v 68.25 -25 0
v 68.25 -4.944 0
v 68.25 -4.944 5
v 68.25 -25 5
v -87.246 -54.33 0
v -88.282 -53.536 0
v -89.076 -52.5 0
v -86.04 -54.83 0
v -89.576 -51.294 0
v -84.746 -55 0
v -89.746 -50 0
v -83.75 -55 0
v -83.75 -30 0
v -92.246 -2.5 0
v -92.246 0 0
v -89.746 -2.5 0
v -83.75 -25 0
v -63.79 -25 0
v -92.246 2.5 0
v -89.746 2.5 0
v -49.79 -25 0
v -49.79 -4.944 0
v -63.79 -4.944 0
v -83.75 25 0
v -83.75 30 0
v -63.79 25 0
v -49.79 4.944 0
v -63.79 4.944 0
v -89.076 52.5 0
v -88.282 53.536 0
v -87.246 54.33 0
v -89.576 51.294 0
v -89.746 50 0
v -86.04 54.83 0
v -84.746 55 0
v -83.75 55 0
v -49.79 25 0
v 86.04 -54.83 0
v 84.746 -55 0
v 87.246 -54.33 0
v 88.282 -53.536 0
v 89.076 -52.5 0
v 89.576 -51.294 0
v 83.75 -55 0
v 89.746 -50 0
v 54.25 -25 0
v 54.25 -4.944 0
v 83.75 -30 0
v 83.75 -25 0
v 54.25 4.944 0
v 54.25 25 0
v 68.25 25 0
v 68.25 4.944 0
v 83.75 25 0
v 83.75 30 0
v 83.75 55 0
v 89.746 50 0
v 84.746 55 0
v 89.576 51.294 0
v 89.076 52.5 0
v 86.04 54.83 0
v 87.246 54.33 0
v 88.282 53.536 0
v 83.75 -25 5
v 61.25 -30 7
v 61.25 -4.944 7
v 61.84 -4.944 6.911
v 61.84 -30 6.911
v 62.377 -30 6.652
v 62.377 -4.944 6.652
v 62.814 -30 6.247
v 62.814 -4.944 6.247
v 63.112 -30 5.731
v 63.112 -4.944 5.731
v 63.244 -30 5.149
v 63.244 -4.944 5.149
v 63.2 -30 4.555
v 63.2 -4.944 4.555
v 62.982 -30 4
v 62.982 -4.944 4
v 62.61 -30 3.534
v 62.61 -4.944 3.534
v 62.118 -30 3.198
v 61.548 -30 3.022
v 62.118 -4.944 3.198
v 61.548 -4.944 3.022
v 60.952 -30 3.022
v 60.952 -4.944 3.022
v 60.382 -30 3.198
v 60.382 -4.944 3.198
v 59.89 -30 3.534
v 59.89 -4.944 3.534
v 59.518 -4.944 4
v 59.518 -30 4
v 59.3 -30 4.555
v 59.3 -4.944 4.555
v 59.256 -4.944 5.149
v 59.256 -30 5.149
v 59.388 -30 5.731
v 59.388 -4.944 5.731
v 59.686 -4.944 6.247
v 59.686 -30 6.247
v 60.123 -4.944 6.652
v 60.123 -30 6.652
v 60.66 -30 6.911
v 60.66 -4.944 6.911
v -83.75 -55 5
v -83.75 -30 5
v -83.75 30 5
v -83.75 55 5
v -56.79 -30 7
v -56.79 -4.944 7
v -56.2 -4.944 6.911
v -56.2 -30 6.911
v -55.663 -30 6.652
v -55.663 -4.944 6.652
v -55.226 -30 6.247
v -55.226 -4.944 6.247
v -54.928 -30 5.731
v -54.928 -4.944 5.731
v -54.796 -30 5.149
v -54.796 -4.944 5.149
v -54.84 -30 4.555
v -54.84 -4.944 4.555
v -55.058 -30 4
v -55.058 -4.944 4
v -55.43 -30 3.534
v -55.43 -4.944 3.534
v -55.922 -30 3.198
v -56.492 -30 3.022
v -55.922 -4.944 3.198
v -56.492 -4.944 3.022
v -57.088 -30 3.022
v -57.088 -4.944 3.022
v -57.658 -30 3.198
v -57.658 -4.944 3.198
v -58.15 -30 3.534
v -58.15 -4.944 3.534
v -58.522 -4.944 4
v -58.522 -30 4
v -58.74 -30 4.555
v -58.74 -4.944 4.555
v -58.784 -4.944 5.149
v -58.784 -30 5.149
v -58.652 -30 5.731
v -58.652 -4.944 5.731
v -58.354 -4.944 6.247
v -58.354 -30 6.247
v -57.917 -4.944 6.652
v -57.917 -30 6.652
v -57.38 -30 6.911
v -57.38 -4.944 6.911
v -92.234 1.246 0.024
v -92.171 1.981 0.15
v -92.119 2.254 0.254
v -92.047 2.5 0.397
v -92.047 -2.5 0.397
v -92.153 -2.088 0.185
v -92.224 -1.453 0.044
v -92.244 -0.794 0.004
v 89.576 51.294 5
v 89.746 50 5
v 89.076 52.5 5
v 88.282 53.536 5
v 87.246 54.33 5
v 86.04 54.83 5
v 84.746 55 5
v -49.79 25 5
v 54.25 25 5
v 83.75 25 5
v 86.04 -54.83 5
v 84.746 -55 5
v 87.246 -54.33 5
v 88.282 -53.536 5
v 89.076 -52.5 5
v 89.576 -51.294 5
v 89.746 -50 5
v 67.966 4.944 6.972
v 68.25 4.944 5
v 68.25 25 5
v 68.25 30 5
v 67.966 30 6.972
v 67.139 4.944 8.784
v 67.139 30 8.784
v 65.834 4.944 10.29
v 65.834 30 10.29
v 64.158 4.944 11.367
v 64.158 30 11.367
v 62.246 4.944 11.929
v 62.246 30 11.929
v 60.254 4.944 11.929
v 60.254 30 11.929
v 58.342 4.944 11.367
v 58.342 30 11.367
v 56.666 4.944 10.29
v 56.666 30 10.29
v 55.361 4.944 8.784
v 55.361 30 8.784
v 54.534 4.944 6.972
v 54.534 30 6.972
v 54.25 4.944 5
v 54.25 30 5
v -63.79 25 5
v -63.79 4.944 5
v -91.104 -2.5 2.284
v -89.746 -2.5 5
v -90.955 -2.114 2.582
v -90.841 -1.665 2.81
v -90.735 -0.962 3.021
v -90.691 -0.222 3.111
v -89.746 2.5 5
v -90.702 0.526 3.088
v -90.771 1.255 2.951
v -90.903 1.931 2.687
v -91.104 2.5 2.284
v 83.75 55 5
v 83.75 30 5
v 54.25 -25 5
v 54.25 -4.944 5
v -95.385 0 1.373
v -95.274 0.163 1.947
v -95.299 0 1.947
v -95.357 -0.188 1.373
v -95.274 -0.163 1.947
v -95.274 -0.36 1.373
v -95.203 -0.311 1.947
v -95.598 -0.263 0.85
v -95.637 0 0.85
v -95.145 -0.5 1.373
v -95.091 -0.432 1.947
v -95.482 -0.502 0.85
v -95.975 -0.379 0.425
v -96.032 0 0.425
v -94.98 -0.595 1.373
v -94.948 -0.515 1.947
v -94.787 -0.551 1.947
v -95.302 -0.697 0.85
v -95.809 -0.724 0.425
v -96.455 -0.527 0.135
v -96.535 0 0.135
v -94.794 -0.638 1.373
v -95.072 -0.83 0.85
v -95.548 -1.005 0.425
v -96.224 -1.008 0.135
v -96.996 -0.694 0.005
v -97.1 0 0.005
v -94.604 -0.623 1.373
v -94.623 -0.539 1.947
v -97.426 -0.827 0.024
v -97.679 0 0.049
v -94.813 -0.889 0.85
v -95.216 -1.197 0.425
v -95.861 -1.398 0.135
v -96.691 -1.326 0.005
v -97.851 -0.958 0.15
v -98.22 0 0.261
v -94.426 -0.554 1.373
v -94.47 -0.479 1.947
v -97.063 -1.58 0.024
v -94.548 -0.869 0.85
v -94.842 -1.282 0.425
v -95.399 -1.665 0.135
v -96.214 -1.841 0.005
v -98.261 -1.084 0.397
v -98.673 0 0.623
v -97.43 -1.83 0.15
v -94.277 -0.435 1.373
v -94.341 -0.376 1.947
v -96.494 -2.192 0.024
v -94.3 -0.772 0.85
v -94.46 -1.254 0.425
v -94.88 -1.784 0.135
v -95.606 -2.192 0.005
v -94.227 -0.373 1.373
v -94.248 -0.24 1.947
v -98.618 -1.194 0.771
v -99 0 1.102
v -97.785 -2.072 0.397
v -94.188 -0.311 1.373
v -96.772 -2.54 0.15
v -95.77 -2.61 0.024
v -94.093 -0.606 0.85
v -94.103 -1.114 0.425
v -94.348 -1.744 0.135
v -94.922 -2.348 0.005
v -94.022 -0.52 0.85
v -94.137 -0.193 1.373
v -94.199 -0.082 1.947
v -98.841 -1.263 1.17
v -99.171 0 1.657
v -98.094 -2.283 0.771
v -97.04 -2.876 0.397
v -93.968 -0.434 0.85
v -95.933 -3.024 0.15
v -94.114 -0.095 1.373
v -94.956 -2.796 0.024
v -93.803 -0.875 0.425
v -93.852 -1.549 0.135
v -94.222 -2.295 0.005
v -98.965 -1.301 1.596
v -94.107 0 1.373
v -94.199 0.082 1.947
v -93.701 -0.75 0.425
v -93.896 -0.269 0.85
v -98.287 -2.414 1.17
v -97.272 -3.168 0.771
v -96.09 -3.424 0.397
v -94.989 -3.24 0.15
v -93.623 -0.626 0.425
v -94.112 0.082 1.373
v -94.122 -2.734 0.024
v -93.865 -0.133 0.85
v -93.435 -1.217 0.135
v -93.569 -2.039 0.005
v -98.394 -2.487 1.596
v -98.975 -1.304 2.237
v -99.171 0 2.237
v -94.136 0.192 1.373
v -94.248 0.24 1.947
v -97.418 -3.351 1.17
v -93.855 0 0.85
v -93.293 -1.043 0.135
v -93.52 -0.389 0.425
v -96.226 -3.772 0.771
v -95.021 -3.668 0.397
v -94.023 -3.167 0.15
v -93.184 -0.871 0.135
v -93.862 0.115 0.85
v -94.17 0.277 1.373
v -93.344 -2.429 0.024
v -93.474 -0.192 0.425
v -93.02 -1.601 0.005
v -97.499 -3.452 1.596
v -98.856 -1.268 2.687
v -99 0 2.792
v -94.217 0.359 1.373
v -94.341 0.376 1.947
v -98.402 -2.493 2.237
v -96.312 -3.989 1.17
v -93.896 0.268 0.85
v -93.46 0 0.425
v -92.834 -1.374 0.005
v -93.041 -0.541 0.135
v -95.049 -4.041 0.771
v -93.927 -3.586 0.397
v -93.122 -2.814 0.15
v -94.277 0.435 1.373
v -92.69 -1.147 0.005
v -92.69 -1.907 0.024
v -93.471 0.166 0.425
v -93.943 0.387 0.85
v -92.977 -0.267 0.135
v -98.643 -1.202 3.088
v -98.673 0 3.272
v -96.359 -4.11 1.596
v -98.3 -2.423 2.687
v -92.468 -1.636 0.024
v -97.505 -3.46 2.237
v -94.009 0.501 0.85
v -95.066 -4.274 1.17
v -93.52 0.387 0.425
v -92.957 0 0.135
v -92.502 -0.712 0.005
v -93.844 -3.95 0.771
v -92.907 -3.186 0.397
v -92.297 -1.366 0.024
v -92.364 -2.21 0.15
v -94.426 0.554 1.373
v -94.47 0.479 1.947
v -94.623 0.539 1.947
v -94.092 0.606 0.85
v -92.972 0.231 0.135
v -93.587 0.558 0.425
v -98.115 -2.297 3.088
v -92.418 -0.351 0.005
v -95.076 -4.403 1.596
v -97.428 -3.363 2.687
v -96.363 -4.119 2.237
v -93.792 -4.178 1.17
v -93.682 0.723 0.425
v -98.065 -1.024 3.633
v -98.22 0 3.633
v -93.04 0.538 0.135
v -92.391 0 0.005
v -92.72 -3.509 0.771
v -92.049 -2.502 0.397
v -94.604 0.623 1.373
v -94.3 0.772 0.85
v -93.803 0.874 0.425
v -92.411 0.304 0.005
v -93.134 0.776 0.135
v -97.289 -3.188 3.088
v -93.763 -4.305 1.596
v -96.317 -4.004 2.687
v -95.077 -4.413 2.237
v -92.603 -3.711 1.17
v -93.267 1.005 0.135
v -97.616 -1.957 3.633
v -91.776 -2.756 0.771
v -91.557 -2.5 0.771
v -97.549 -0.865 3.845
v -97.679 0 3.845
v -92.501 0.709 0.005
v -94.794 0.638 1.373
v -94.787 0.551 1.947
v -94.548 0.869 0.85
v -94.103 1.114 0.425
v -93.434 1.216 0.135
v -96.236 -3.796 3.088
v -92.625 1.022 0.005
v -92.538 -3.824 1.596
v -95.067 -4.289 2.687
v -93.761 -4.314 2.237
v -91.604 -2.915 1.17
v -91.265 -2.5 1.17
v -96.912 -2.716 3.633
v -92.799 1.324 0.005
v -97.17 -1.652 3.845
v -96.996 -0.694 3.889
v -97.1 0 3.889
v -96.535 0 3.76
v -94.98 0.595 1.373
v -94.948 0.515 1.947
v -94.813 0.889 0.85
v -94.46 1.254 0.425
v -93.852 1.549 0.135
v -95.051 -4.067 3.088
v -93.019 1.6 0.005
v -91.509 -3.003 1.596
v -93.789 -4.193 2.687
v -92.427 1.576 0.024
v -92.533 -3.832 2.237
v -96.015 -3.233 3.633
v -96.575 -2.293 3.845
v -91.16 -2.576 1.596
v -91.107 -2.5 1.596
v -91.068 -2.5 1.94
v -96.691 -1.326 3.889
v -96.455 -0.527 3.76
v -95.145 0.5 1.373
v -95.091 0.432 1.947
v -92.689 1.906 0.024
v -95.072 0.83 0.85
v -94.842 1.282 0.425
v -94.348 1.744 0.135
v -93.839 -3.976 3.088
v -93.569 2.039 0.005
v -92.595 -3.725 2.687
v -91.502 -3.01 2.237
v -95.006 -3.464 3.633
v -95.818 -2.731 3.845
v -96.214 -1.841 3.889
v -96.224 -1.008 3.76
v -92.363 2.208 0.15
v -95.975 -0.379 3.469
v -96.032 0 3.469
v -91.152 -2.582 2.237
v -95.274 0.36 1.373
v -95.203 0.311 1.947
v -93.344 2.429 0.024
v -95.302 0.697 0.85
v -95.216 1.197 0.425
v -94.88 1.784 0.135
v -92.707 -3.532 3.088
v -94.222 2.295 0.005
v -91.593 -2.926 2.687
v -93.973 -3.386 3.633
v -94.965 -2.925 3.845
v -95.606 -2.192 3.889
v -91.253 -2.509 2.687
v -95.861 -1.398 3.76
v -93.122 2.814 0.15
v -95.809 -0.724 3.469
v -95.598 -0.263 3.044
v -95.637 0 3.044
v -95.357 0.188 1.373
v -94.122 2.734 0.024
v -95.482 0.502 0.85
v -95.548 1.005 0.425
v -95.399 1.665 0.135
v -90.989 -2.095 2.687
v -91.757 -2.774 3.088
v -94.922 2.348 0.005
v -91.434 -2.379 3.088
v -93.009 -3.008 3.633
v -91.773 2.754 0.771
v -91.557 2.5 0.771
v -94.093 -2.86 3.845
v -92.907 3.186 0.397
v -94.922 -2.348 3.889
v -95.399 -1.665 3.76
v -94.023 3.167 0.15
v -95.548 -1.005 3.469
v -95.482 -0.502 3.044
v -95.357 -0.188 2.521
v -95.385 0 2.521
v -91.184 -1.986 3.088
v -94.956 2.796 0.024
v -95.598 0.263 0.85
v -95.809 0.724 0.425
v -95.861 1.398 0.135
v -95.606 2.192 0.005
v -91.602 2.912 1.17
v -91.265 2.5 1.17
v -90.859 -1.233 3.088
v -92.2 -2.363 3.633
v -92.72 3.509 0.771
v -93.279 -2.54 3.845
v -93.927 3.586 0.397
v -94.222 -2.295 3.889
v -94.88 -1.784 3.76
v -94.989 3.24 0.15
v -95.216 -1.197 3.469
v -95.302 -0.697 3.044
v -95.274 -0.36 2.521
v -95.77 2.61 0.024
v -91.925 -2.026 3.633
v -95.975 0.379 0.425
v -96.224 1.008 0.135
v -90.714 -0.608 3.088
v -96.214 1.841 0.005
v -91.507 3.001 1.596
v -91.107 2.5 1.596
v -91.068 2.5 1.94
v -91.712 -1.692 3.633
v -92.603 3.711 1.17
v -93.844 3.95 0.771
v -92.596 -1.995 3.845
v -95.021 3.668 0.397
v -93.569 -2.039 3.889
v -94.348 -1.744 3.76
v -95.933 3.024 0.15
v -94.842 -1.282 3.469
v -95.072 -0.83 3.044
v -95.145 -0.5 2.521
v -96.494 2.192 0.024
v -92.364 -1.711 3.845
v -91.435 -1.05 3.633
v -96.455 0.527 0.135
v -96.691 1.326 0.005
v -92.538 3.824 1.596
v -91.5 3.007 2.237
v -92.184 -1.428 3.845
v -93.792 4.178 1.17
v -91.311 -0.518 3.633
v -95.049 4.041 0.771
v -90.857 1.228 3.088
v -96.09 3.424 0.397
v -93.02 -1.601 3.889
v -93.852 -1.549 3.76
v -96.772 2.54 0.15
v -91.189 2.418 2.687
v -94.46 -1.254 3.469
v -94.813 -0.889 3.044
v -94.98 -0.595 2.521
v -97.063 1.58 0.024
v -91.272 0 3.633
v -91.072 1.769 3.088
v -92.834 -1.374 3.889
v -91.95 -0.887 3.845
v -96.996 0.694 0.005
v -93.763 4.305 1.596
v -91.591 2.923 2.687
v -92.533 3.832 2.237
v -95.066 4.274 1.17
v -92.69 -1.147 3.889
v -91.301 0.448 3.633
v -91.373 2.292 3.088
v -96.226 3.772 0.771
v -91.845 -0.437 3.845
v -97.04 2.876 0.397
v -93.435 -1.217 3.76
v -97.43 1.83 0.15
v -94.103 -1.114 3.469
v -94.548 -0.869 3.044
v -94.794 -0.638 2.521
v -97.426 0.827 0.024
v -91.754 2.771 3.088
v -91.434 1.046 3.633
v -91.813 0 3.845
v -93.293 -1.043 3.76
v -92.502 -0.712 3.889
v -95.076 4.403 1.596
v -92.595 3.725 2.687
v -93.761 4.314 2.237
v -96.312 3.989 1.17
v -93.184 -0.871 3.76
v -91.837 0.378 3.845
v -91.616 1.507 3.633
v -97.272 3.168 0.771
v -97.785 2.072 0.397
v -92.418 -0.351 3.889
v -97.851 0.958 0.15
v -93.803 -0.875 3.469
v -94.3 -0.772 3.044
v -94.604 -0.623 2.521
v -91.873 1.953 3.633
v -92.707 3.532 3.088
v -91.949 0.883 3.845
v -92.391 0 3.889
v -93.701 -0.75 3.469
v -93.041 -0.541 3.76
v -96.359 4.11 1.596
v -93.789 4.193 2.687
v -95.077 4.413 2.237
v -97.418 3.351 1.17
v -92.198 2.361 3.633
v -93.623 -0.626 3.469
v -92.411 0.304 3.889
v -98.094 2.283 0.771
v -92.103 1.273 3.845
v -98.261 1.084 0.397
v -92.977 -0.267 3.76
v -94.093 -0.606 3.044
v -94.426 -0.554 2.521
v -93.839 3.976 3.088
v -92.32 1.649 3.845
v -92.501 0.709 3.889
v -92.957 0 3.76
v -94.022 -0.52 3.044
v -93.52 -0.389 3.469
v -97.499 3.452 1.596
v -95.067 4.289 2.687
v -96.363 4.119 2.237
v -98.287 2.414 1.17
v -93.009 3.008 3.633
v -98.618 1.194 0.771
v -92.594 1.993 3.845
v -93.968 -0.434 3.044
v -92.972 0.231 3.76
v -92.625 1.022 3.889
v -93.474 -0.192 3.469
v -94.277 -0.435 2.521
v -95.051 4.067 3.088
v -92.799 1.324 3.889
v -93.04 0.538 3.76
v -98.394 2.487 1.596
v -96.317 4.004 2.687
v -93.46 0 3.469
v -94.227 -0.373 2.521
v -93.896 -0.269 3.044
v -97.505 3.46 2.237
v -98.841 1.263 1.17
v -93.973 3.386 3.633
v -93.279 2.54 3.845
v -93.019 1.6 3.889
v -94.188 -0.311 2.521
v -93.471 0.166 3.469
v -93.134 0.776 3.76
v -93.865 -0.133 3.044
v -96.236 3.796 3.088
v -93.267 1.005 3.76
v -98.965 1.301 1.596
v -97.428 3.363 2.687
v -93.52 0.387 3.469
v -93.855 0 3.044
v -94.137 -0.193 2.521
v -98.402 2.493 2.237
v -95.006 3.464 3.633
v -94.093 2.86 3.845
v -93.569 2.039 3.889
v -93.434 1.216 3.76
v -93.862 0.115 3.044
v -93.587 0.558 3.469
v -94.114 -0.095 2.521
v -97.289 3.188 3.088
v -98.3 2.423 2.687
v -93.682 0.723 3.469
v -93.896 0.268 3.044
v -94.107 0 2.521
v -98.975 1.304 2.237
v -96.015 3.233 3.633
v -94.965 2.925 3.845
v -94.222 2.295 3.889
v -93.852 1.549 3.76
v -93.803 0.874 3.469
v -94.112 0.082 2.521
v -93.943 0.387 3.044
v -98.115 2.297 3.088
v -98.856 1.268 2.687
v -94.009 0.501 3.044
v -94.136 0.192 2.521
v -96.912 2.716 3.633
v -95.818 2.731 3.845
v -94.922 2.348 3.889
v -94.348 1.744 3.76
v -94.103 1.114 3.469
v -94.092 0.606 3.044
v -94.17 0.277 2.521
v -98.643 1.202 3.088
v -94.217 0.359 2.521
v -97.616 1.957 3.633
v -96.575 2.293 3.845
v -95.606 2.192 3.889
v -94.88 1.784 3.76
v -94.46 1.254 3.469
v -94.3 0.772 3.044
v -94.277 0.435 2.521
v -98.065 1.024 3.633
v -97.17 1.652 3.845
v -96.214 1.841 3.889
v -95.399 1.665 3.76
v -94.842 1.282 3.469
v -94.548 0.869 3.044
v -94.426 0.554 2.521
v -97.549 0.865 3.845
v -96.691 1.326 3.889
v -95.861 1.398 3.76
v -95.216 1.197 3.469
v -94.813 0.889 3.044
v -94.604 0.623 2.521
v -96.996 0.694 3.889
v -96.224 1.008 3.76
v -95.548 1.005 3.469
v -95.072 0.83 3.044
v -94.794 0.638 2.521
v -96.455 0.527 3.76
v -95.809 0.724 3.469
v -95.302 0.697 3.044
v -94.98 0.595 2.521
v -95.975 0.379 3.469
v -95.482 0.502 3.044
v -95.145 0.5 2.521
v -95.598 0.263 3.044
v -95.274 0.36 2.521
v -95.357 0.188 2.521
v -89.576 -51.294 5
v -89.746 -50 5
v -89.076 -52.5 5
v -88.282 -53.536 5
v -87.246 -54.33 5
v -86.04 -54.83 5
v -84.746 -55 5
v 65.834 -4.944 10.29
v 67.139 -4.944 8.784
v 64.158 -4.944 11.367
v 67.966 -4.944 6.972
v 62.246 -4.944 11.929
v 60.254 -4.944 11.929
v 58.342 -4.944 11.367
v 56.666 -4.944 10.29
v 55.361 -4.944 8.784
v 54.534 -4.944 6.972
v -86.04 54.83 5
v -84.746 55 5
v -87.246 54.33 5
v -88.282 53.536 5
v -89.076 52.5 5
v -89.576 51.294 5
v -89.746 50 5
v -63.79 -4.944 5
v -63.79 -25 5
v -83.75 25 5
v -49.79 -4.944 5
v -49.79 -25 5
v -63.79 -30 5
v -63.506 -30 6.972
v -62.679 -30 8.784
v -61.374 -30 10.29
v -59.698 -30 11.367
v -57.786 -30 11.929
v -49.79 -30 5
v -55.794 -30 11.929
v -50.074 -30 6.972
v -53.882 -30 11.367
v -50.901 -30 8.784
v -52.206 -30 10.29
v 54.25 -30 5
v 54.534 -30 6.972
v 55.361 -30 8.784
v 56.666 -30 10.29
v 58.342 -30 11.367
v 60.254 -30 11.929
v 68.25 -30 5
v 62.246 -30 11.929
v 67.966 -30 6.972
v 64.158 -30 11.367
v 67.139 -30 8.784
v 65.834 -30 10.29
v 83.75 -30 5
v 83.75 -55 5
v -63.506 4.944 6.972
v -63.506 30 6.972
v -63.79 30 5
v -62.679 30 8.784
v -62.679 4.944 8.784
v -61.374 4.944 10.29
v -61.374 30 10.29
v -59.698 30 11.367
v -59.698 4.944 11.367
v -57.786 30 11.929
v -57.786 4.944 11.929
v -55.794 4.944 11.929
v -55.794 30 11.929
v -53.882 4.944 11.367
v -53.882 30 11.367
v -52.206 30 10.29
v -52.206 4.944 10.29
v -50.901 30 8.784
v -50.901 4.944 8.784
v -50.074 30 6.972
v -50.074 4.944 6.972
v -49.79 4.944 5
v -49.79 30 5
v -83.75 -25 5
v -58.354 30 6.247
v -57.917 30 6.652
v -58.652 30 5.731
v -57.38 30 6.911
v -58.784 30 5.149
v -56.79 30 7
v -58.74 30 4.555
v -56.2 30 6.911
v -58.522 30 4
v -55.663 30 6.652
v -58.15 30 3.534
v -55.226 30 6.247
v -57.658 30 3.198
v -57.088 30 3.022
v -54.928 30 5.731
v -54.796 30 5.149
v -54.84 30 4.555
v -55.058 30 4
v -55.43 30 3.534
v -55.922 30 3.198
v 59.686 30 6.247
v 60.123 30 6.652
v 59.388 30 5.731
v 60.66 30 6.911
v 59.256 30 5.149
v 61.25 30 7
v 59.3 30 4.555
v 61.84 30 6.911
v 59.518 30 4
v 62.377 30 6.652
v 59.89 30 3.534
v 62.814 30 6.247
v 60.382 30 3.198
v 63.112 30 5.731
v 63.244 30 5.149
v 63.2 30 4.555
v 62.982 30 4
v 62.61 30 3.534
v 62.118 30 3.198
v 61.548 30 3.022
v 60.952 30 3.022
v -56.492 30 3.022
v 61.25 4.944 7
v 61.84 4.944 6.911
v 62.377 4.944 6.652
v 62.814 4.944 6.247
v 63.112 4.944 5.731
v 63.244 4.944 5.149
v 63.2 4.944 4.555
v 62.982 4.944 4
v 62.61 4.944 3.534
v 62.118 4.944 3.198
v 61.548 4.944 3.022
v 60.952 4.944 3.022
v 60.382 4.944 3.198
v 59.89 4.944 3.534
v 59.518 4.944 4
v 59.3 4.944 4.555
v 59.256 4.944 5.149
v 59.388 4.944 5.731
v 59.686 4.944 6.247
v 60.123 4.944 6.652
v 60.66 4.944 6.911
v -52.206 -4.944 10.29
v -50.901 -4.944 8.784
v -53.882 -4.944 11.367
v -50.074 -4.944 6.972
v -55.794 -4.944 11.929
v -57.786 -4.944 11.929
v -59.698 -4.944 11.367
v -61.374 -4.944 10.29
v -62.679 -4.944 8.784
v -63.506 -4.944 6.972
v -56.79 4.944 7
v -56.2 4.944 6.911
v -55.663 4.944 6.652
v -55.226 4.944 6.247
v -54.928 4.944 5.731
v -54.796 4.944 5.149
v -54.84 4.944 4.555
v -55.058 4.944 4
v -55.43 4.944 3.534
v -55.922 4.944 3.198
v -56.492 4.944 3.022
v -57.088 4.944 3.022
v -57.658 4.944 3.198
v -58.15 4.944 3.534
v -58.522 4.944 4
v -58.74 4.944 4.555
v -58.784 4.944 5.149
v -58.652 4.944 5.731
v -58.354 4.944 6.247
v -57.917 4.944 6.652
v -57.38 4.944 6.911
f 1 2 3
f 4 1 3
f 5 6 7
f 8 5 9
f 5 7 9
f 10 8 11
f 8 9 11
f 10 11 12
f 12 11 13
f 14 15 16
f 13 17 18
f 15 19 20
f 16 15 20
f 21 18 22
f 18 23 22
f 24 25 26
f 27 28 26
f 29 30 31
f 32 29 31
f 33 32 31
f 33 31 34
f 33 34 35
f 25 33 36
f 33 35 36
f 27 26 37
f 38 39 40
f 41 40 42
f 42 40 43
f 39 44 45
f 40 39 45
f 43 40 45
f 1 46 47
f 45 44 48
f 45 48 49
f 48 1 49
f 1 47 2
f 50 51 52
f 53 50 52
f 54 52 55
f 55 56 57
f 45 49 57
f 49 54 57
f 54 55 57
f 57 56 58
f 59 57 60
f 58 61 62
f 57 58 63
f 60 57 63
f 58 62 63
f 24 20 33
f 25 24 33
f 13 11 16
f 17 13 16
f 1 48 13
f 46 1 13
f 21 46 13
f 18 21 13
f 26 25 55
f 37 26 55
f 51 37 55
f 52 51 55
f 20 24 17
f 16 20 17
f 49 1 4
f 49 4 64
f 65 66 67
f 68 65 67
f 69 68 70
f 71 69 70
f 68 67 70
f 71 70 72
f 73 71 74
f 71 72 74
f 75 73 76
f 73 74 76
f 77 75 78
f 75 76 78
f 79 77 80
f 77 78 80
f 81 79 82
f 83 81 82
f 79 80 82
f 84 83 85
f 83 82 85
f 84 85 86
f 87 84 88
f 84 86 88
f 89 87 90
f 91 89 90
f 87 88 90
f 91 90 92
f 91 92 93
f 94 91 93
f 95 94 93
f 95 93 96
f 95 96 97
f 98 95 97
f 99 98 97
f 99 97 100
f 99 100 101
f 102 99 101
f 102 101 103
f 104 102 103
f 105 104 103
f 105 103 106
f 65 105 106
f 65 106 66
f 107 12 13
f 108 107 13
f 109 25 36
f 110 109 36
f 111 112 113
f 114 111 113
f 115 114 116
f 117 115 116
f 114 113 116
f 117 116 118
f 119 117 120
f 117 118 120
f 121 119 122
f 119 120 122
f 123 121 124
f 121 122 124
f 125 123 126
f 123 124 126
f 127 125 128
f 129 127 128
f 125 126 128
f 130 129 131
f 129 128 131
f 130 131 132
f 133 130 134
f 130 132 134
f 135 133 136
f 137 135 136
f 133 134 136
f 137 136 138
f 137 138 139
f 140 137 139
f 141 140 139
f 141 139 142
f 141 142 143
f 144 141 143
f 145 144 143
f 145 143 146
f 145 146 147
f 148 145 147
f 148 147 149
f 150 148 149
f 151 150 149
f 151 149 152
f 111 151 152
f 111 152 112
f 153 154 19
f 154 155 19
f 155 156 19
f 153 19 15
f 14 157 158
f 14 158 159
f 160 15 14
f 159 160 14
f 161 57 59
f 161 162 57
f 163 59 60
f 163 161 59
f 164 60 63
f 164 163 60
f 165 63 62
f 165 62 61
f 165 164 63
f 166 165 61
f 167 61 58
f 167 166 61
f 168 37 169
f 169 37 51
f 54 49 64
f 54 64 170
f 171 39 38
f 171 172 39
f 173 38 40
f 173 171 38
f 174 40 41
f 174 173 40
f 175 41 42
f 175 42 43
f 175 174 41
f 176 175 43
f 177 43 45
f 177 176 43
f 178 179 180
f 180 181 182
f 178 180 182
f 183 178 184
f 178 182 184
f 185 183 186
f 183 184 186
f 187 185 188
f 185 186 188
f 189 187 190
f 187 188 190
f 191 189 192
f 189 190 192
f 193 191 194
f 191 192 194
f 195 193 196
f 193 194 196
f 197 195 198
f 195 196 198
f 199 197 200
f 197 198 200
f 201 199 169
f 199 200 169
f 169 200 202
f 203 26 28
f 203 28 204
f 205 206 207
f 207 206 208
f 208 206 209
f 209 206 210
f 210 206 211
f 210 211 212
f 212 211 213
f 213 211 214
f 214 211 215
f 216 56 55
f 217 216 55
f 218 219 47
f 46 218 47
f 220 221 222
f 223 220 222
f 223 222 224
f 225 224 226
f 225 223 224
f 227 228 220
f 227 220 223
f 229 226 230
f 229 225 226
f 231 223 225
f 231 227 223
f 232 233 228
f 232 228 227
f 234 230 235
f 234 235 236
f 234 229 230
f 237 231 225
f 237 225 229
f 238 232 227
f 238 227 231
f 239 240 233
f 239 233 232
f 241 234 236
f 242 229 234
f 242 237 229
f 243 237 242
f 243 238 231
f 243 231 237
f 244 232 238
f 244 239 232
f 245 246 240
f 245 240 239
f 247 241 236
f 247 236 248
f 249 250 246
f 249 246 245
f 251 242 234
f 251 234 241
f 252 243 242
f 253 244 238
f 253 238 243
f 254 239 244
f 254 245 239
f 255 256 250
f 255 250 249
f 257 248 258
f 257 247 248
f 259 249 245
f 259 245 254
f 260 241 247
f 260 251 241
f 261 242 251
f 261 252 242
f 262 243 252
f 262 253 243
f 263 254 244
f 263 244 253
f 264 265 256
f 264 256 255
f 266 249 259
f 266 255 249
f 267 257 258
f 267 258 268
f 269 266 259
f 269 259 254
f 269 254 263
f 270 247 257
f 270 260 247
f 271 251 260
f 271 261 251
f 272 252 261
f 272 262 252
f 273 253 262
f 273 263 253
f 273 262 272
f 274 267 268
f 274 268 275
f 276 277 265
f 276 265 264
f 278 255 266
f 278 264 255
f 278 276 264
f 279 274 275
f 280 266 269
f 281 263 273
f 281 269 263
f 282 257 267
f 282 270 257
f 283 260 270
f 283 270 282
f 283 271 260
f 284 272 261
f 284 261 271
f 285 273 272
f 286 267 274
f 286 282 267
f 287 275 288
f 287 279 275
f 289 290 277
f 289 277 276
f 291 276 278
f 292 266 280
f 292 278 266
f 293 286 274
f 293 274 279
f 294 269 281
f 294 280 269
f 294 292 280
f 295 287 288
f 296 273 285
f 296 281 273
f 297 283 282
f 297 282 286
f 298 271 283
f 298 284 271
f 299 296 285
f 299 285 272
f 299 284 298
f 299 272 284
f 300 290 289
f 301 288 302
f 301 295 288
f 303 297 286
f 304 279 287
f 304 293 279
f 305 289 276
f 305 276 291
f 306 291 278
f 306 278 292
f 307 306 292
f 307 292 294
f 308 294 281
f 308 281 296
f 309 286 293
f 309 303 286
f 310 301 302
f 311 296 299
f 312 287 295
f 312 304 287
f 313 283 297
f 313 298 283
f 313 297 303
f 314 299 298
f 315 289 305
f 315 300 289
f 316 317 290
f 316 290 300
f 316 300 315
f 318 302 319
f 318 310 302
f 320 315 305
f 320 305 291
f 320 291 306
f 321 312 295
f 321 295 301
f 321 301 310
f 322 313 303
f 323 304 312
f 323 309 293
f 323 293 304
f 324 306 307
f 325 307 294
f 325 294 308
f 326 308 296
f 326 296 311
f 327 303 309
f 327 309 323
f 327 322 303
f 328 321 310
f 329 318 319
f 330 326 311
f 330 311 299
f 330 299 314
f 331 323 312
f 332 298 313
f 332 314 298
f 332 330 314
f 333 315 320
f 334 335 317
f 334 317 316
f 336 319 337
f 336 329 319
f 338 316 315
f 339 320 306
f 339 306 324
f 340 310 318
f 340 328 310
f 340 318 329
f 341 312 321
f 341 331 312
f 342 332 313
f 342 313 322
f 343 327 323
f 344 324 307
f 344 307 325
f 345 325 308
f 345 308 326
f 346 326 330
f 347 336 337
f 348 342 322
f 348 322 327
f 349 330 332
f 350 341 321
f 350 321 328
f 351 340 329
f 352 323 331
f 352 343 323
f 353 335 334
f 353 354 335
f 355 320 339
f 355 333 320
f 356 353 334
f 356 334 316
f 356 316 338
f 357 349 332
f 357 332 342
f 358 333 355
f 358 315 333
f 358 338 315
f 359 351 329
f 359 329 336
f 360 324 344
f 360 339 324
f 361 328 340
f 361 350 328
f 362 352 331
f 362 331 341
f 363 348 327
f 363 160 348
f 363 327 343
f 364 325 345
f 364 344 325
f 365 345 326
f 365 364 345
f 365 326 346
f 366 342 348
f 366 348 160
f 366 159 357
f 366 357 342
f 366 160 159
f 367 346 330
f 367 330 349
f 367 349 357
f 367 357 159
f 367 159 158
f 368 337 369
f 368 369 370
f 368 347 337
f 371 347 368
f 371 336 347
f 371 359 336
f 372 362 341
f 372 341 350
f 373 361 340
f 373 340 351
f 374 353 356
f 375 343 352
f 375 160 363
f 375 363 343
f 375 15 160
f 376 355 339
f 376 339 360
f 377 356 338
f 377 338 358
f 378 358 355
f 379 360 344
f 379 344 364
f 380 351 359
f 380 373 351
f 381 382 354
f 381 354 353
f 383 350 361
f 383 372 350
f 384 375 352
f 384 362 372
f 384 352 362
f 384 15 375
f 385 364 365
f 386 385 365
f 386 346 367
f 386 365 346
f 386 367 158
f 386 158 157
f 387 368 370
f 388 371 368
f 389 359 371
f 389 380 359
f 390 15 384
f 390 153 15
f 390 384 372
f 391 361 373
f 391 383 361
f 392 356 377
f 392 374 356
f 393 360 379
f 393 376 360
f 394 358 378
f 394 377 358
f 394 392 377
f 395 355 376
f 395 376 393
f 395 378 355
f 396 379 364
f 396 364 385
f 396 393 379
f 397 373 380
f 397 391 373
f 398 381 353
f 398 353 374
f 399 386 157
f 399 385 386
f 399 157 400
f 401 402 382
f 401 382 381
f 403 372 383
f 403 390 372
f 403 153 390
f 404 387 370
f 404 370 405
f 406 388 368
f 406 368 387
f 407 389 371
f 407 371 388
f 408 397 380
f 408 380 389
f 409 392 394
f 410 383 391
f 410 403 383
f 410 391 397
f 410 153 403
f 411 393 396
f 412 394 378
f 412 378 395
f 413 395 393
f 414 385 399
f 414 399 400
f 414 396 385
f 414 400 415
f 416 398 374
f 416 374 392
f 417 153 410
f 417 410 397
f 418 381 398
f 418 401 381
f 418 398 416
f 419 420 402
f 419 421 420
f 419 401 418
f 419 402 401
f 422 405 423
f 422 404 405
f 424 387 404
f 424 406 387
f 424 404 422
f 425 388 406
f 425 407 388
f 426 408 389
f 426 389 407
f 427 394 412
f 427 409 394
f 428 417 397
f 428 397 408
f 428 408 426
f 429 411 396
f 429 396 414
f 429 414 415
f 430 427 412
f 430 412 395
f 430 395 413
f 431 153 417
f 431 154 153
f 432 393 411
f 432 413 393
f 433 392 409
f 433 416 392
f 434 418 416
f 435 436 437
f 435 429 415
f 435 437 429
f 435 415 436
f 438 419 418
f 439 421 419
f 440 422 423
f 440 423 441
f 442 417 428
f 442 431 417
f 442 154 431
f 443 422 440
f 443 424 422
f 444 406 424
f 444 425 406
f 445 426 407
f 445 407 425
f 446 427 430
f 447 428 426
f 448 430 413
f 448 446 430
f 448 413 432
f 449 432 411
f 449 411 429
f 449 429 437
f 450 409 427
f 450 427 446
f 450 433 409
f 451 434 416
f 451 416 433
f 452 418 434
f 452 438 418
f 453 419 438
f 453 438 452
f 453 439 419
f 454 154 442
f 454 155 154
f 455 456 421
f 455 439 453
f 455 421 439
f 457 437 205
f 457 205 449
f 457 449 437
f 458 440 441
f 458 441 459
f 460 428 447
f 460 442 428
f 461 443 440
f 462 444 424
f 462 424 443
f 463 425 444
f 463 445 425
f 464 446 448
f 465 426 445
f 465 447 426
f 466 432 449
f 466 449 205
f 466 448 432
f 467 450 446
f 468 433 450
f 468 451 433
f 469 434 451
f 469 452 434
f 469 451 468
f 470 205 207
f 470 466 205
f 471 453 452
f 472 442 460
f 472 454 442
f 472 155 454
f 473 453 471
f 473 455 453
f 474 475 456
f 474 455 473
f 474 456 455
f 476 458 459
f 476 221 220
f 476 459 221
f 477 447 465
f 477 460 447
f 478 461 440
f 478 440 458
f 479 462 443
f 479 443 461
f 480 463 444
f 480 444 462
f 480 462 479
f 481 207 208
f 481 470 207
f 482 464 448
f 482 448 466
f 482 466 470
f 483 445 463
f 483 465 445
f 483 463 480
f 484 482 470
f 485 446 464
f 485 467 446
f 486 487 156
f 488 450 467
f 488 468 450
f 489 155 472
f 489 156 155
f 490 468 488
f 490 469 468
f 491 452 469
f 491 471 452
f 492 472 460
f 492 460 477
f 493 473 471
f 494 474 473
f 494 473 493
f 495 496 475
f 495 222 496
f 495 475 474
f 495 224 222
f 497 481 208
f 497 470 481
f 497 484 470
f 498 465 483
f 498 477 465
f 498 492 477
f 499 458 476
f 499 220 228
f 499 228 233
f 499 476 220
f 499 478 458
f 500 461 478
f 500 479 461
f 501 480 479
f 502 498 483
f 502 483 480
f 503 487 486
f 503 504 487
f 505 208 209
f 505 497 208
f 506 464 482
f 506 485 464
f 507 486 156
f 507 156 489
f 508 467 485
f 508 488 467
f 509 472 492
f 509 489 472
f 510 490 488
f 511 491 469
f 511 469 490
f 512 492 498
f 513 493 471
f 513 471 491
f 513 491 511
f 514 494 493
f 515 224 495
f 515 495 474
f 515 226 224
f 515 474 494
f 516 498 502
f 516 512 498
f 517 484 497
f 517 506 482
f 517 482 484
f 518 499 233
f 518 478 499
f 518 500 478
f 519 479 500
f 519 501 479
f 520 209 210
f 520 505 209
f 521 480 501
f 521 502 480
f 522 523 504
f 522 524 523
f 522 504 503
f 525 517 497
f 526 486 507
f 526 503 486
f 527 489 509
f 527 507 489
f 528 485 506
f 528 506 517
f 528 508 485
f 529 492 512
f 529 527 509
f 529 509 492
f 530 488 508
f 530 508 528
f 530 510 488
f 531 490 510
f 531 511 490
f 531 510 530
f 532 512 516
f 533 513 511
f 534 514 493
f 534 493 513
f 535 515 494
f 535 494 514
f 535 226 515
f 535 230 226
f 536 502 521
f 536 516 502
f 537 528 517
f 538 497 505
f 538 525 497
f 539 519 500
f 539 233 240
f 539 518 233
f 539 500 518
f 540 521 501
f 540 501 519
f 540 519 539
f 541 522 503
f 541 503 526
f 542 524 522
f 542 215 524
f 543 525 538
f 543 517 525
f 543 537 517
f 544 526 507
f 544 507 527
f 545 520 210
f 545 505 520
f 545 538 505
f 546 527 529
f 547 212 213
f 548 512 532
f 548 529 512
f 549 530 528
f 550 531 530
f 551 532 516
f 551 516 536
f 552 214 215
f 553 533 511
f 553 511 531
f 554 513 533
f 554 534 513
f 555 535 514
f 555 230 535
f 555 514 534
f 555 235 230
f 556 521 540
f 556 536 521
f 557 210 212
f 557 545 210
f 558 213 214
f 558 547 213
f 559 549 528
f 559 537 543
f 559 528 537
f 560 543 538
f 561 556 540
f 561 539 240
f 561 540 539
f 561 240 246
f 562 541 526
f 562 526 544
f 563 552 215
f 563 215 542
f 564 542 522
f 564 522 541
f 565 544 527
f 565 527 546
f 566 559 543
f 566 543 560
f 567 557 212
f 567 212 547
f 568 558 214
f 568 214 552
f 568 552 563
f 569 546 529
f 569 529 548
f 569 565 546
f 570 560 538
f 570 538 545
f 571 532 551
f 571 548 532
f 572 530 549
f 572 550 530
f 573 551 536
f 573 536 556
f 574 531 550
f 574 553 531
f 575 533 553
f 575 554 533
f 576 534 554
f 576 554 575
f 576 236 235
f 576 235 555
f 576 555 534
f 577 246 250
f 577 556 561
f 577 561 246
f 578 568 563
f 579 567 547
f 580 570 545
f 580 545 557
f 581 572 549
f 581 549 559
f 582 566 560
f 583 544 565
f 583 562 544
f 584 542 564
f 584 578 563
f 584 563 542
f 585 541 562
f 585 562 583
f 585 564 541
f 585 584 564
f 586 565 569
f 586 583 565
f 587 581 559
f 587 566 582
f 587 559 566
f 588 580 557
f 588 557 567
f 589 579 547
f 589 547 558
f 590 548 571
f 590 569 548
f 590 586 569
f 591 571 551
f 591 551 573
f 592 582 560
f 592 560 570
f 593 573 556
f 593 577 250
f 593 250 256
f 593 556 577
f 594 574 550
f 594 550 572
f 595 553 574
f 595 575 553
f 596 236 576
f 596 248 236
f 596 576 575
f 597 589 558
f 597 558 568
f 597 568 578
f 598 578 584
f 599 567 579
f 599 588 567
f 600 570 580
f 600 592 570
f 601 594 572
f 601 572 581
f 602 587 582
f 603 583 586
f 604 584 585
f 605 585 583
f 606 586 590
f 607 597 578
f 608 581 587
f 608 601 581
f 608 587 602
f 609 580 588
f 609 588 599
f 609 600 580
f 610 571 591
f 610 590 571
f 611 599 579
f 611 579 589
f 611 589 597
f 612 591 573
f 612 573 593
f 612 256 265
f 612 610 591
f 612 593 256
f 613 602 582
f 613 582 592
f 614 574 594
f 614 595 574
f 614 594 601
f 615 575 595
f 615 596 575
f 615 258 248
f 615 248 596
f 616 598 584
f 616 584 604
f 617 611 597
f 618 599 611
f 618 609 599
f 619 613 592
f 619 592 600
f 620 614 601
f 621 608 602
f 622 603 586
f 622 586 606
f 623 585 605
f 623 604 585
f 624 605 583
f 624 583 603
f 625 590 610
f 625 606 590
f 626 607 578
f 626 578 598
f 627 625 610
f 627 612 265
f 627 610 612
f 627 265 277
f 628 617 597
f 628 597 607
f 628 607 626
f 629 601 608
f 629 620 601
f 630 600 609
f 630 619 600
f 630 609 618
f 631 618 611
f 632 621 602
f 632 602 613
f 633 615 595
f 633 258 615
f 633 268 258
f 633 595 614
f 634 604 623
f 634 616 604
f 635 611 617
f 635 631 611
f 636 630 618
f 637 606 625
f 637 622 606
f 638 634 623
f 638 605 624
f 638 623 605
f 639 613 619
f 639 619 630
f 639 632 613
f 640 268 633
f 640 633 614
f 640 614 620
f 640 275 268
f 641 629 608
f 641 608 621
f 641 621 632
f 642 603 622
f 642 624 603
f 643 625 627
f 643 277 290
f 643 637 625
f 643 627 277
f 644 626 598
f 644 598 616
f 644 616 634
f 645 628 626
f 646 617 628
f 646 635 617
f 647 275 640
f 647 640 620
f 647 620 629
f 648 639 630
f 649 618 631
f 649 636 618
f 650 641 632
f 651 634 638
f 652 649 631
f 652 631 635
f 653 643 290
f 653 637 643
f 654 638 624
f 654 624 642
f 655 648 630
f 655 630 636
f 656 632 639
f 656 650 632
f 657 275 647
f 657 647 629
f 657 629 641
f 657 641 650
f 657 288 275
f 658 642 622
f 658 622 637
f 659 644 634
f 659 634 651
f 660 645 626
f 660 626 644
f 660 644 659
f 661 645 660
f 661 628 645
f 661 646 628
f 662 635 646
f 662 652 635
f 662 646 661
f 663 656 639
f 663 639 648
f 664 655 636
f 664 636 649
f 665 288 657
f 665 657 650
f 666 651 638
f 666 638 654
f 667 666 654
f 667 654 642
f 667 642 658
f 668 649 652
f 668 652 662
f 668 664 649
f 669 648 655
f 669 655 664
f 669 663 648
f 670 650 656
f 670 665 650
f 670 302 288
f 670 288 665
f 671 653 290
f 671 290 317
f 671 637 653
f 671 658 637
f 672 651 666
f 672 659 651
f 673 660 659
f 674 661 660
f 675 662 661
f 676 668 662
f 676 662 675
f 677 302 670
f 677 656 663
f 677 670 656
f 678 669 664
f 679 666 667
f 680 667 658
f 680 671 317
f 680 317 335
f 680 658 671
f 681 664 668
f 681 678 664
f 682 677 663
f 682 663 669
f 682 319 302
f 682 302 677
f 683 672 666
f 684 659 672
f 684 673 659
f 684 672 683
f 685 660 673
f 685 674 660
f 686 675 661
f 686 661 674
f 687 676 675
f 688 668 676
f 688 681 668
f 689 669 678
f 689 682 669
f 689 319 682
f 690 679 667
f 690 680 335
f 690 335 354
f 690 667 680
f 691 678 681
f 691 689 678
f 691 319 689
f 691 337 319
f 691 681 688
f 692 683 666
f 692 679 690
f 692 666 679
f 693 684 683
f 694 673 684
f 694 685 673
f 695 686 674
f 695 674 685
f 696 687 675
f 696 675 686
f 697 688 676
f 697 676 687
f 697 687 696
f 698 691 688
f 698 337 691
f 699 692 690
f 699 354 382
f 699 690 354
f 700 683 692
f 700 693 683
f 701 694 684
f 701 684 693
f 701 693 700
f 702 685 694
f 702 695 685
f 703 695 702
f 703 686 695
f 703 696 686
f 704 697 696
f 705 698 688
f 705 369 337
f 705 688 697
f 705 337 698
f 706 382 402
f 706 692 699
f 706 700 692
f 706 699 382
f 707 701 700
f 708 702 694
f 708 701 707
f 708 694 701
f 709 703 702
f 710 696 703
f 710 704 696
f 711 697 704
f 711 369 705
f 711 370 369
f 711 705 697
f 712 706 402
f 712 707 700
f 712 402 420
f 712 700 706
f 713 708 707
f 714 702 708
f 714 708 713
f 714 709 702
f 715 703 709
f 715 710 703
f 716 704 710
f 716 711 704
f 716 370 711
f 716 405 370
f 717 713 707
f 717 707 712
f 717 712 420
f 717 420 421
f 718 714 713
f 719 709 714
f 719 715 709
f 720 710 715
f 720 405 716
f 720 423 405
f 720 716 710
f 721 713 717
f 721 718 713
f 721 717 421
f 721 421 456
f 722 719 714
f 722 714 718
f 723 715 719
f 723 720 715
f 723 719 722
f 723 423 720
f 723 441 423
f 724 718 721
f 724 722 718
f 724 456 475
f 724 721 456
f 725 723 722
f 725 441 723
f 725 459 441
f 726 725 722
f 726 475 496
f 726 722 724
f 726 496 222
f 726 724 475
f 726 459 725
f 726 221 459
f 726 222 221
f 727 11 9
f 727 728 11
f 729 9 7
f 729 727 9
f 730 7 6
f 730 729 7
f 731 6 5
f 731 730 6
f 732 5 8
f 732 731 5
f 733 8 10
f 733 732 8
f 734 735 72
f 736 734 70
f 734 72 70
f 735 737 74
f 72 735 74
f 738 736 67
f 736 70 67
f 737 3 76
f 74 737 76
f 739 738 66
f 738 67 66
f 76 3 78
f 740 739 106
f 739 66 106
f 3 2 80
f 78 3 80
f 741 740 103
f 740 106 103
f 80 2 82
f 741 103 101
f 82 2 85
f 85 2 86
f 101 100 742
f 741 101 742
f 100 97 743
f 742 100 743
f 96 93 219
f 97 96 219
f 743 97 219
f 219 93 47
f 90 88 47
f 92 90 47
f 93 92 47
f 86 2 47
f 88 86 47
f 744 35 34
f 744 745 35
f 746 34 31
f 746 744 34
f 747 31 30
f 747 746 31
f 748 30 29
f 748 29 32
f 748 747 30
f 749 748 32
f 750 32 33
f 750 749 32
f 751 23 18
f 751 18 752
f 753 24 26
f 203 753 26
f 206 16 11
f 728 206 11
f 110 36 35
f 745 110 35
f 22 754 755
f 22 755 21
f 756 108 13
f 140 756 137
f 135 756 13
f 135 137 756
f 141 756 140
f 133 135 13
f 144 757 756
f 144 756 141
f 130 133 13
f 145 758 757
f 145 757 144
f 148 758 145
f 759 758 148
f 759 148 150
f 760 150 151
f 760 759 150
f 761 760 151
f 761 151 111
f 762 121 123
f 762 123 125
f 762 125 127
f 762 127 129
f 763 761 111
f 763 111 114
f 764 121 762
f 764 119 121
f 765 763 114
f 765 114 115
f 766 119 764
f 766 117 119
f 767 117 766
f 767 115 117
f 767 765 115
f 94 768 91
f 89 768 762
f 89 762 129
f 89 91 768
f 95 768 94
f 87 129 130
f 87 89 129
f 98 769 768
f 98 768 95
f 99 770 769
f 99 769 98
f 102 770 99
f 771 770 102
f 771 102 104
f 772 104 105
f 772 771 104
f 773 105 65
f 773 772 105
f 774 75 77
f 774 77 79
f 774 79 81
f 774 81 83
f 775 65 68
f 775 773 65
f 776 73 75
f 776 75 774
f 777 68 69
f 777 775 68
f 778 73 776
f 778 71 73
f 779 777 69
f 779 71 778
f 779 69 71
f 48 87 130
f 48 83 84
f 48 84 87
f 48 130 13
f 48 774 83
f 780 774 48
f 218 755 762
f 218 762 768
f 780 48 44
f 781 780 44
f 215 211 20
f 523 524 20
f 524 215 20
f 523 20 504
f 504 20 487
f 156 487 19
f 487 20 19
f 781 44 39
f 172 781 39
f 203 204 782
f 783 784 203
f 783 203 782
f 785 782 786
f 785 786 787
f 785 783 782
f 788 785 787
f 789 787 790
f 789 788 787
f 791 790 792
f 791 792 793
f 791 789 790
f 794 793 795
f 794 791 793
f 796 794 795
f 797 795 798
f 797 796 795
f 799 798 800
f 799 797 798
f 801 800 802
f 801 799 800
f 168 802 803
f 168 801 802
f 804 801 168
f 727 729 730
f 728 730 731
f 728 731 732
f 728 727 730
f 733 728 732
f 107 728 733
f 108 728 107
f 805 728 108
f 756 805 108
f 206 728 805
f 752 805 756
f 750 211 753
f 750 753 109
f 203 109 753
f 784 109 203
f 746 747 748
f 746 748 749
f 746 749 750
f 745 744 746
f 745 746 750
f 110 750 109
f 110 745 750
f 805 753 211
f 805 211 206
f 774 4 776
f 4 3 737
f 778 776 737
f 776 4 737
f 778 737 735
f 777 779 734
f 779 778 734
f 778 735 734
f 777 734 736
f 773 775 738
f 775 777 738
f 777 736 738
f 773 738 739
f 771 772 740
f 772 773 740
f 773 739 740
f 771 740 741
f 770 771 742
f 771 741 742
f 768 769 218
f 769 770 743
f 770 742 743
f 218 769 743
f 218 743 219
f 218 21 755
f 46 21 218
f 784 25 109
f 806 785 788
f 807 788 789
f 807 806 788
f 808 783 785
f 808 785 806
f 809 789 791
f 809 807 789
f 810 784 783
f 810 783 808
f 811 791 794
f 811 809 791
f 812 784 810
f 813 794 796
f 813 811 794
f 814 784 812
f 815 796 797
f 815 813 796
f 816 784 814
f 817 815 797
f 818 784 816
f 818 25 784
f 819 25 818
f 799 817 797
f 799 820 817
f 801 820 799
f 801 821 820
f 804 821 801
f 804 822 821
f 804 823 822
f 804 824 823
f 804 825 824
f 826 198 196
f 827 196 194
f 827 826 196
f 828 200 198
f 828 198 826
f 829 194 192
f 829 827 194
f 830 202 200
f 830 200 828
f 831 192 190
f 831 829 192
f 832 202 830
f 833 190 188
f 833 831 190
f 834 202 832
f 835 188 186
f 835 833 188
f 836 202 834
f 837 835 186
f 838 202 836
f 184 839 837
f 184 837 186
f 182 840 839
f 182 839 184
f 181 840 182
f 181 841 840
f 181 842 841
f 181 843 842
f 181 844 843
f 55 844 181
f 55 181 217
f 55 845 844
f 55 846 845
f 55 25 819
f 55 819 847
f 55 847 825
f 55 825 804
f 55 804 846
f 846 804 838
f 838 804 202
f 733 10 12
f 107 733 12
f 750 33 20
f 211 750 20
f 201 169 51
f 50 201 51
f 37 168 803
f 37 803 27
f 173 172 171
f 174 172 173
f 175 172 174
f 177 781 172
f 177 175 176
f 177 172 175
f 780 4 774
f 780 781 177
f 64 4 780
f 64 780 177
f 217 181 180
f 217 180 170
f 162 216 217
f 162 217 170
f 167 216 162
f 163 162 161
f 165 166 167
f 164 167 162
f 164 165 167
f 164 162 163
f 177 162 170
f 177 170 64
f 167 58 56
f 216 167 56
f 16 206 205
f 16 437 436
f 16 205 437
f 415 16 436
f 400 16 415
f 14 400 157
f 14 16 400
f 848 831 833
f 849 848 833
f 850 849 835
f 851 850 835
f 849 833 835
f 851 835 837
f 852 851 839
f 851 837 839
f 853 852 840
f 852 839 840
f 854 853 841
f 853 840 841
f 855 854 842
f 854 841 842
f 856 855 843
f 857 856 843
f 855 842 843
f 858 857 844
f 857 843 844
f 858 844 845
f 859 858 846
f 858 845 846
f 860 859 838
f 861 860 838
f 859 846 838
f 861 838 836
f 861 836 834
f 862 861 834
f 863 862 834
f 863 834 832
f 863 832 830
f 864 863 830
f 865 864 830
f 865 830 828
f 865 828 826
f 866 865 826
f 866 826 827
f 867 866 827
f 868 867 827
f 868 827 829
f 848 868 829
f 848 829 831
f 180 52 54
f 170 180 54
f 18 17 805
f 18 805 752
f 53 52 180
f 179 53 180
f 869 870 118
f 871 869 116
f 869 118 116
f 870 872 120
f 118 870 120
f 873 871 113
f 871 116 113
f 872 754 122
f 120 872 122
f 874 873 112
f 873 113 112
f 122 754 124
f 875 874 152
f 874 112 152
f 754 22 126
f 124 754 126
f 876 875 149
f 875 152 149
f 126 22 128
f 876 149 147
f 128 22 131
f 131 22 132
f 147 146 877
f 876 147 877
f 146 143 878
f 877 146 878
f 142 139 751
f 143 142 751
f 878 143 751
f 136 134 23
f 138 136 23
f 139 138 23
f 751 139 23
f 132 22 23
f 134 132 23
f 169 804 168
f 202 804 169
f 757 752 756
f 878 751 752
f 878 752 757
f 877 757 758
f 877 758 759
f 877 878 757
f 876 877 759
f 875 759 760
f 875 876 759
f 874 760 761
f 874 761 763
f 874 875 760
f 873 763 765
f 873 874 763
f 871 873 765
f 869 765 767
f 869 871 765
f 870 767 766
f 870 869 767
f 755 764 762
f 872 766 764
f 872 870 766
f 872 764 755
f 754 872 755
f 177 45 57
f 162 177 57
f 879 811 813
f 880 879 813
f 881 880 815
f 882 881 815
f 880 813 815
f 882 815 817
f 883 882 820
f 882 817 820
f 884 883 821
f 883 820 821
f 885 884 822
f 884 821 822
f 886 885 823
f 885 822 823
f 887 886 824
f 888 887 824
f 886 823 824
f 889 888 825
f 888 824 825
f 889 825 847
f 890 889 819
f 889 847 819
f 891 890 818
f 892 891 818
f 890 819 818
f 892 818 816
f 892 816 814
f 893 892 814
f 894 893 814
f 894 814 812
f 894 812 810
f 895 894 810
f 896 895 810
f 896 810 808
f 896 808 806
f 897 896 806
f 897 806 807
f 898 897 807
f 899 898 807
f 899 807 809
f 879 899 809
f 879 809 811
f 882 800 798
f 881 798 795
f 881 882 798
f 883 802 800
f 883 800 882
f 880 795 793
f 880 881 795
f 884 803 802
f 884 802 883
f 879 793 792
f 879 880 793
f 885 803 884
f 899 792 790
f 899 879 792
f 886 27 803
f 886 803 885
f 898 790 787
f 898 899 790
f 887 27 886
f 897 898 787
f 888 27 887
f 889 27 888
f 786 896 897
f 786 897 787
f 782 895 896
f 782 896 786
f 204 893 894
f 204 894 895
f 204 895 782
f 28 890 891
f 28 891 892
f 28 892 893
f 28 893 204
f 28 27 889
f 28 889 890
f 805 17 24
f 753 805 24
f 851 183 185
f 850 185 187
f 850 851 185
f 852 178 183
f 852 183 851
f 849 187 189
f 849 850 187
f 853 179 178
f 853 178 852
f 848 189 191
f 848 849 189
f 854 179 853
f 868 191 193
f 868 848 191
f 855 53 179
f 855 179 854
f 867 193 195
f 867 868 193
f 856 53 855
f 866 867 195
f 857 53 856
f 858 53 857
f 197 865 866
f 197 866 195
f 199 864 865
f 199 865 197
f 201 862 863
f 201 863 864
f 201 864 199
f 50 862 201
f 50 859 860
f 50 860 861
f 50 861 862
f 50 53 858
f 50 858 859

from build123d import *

# Parameters (mm, degrees)
SKETCH1_W           = 167.5
SKETCH1_H           = 50
BOSS_EXTRUDE1_DEPTH = 5
BOSS_EXTRUDE2_REACH = 125.711
SKETCH3_R           = 2
CUT_EXTRUDE1_DEPTH  = 125.190739079
SKETCH6_R           = 1.947134786
BOSS_EXTRUDE7_DEPTH = 2.5
BOSS_EXTRUDE9_REACH = 133.18
SKETCH10_R          = 2
CUT_EXTRUDE3_DEPTH  = 132.180305898
FILLET2_R           = 5
SKETCH11_W          = 132.04
SKETCH11_H          = 9.88782449
CUT_EXTRUDE5_DEPTH  = 36


with BuildPart() as part:
    # Sketch1 → Boss-Extrude1 (new body)
    with BuildSketch(Plane.XY):
        Polygon((-83.75, 30), (-83.75, 55), (-89.745973018, 55), (-89.745973018, -55), (-83.75, -55), (-83.75, -30), (83.75, -30), (83.75, -55), (89.745973018, -55), (89.745973018, 55), (83.75, 55), (83.75, 30), align=None)
        Rectangle(SKETCH1_W, SKETCH1_H, mode=Mode.SUBTRACT)
    extrude(amount=BOSS_EXTRUDE1_DEPTH)

    # Boss-Extrude2: up to this face of the body (flat: up to its plane)
    boss_extrude2_end = Plane(part.part.faces().sort_by_distance((0, -30, 2.5))[0])
    # Sketch2 → Boss-Extrude2 (add, up to the picked face)
    with BuildSketch(Plane(origin=(0, 30, 0), x_dir=(1, 0, 0), z_dir=(0, 1, 0)), mode=Mode.PRIVATE) as boss_extrude2_sk1:
        with BuildLine():
            Line((-56.79, -5), (-63.79, -5))
            ThreePointArc((-63.79, -5), (-56.79, -12), (-49.79, -5))
            Line((-49.79, -5), (-56.79, -5))
        make_face()
    boss_extrude2_tool1 = split(extrude(boss_extrude2_sk1.sketch, amount=-BOSS_EXTRUDE2_REACH, mode=Mode.PRIVATE), bisect_by=boss_extrude2_end, keep=Keep.BOTH, mode=Mode.PRIVATE)
    # Sketch2 → Boss-Extrude2 (add, up to the picked face)
    with BuildSketch(Plane(origin=(0, 30, 0), x_dir=(1, 0, 0), z_dir=(0, 1, 0)), mode=Mode.PRIVATE) as boss_extrude2_sk2:
        Polygon((-63.79, 0), (-63.79, -5), (-56.79, -5), (-49.79, -5), (-49.79, 0), align=None)
    boss_extrude2_tool2 = split(extrude(boss_extrude2_sk2.sketch, amount=-BOSS_EXTRUDE2_REACH, mode=Mode.PRIVATE), bisect_by=boss_extrude2_end, keep=Keep.BOTH, mode=Mode.PRIVATE)
    add(boss_extrude2_tool1.solids().sort_by(Axis((-56.79, 30, 7.970892), (0, -1, 0)))[0])
    add(boss_extrude2_tool2.solids().sort_by(Axis((-56.79, 30, 2.5), (0, -1, 0)))[0])

    # Sketch3 → Cut-Extrude1 (cut, through all)
    with BuildSketch(Plane(origin=(0, 30, 0), x_dir=(1, 0, 0), z_dir=(0, 1, 0))):
        with Locations(Location((-56.79, -5, 0), (0, 0, 270))):
            Circle(SKETCH3_R)
    extrude(amount=-CUT_EXTRUDE1_DEPTH, mode=Mode.SUBTRACT)



with BuildPart() as body_2:
    # Sketch6 → Revolve2 (revolve)
    with BuildSketch(Plane(origin=(0, 0, 0), x_dir=(1, 0, 0), z_dir=(0, 1, 0))):
        with Locations((-97.245973018, -1.947134786)):
            Circle(SKETCH6_R)
    revolve(axis=Axis((-94.745973018, 0, 0), (0, 0, 1)))


with BuildPart() as part_1:
    add(part.part)

    add(body_2.part)  # Boss-Extrude7 merges body 2
    # Sketch9 → Boss-Extrude7 (add, symmetric)
    with BuildSketch(Plane(origin=(0, 0, 0), x_dir=(1, 0, 0), z_dir=(0, 1, 0))):
        Polygon((-92.245973018, 0), (-89.745973018, 0), (-89.745973018, -5), align=None)
    extrude(amount=BOSS_EXTRUDE7_DEPTH, both=True)

    # Boss-Extrude9: up to this face of the body (flat: up to its plane)
    boss_extrude9_end = Plane(part_1.part.faces().sort_by_distance((-4.055234189, -30, 2.93205693))[0])
    # Sketch4 → Boss-Extrude9 (add, up to the picked face)
    with BuildSketch(Plane(origin=(0, 30, 0), x_dir=(1, 0, 0), z_dir=(0, 1, 0)), mode=Mode.PRIVATE) as boss_extrude9_sk1:
        with BuildLine():
            Line((68.25, 0), (68.25, -5))
            ThreePointArc((68.25, -5), (61.25, -12), (54.25, -5))
            Line((54.25, -5), (54.25, 0))
            Line((54.25, 0), (68.25, 0))
        make_face()
    boss_extrude9_tool1 = split(extrude(boss_extrude9_sk1.sketch, amount=-BOSS_EXTRUDE9_REACH, mode=Mode.PRIVATE), bisect_by=boss_extrude9_end, keep=Keep.BOTH, mode=Mode.PRIVATE)
    add(boss_extrude9_tool1.solids().sort_by(Axis((61.25, 30, 5.365156), (0, -1, 0)))[0])

    # Sketch10 → Cut-Extrude3 (cut, through all)
    with BuildSketch(Plane(origin=(0, 30, 0), x_dir=(1, 0, 0), z_dir=(0, 1, 0))):
        with Locations(Location((61.25, -5, 0), (0, 0, 270))):
            Circle(SKETCH10_R)
    extrude(amount=-CUT_EXTRUDE3_DEPTH, mode=Mode.SUBTRACT)

    # Fillet2
    fillet2_edges = [part_1.edges().sort_by_distance(p)[0] for p in [
        (89.745973018, -55, 2.5),
        (89.745973018, 55, 2.5),
        (-89.745973018, 55, 2.5),
        (-89.745973018, -55, 2.5),
    ]]
    fillet(fillet2_edges, radius=FILLET2_R)

    # Sketch11 → Cut-Extrude5 (cut)
    with BuildSketch(Plane(origin=(0, 0, 0), x_dir=(-1, 0, 0), z_dir=(0, 0, -1))):
        with Locations((-2.23, 0)):
            Rectangle(SKETCH11_W, SKETCH11_H)
    extrude(amount=-CUT_EXTRUDE5_DEPTH, mode=Mode.SUBTRACT)


solid = part_1.part
